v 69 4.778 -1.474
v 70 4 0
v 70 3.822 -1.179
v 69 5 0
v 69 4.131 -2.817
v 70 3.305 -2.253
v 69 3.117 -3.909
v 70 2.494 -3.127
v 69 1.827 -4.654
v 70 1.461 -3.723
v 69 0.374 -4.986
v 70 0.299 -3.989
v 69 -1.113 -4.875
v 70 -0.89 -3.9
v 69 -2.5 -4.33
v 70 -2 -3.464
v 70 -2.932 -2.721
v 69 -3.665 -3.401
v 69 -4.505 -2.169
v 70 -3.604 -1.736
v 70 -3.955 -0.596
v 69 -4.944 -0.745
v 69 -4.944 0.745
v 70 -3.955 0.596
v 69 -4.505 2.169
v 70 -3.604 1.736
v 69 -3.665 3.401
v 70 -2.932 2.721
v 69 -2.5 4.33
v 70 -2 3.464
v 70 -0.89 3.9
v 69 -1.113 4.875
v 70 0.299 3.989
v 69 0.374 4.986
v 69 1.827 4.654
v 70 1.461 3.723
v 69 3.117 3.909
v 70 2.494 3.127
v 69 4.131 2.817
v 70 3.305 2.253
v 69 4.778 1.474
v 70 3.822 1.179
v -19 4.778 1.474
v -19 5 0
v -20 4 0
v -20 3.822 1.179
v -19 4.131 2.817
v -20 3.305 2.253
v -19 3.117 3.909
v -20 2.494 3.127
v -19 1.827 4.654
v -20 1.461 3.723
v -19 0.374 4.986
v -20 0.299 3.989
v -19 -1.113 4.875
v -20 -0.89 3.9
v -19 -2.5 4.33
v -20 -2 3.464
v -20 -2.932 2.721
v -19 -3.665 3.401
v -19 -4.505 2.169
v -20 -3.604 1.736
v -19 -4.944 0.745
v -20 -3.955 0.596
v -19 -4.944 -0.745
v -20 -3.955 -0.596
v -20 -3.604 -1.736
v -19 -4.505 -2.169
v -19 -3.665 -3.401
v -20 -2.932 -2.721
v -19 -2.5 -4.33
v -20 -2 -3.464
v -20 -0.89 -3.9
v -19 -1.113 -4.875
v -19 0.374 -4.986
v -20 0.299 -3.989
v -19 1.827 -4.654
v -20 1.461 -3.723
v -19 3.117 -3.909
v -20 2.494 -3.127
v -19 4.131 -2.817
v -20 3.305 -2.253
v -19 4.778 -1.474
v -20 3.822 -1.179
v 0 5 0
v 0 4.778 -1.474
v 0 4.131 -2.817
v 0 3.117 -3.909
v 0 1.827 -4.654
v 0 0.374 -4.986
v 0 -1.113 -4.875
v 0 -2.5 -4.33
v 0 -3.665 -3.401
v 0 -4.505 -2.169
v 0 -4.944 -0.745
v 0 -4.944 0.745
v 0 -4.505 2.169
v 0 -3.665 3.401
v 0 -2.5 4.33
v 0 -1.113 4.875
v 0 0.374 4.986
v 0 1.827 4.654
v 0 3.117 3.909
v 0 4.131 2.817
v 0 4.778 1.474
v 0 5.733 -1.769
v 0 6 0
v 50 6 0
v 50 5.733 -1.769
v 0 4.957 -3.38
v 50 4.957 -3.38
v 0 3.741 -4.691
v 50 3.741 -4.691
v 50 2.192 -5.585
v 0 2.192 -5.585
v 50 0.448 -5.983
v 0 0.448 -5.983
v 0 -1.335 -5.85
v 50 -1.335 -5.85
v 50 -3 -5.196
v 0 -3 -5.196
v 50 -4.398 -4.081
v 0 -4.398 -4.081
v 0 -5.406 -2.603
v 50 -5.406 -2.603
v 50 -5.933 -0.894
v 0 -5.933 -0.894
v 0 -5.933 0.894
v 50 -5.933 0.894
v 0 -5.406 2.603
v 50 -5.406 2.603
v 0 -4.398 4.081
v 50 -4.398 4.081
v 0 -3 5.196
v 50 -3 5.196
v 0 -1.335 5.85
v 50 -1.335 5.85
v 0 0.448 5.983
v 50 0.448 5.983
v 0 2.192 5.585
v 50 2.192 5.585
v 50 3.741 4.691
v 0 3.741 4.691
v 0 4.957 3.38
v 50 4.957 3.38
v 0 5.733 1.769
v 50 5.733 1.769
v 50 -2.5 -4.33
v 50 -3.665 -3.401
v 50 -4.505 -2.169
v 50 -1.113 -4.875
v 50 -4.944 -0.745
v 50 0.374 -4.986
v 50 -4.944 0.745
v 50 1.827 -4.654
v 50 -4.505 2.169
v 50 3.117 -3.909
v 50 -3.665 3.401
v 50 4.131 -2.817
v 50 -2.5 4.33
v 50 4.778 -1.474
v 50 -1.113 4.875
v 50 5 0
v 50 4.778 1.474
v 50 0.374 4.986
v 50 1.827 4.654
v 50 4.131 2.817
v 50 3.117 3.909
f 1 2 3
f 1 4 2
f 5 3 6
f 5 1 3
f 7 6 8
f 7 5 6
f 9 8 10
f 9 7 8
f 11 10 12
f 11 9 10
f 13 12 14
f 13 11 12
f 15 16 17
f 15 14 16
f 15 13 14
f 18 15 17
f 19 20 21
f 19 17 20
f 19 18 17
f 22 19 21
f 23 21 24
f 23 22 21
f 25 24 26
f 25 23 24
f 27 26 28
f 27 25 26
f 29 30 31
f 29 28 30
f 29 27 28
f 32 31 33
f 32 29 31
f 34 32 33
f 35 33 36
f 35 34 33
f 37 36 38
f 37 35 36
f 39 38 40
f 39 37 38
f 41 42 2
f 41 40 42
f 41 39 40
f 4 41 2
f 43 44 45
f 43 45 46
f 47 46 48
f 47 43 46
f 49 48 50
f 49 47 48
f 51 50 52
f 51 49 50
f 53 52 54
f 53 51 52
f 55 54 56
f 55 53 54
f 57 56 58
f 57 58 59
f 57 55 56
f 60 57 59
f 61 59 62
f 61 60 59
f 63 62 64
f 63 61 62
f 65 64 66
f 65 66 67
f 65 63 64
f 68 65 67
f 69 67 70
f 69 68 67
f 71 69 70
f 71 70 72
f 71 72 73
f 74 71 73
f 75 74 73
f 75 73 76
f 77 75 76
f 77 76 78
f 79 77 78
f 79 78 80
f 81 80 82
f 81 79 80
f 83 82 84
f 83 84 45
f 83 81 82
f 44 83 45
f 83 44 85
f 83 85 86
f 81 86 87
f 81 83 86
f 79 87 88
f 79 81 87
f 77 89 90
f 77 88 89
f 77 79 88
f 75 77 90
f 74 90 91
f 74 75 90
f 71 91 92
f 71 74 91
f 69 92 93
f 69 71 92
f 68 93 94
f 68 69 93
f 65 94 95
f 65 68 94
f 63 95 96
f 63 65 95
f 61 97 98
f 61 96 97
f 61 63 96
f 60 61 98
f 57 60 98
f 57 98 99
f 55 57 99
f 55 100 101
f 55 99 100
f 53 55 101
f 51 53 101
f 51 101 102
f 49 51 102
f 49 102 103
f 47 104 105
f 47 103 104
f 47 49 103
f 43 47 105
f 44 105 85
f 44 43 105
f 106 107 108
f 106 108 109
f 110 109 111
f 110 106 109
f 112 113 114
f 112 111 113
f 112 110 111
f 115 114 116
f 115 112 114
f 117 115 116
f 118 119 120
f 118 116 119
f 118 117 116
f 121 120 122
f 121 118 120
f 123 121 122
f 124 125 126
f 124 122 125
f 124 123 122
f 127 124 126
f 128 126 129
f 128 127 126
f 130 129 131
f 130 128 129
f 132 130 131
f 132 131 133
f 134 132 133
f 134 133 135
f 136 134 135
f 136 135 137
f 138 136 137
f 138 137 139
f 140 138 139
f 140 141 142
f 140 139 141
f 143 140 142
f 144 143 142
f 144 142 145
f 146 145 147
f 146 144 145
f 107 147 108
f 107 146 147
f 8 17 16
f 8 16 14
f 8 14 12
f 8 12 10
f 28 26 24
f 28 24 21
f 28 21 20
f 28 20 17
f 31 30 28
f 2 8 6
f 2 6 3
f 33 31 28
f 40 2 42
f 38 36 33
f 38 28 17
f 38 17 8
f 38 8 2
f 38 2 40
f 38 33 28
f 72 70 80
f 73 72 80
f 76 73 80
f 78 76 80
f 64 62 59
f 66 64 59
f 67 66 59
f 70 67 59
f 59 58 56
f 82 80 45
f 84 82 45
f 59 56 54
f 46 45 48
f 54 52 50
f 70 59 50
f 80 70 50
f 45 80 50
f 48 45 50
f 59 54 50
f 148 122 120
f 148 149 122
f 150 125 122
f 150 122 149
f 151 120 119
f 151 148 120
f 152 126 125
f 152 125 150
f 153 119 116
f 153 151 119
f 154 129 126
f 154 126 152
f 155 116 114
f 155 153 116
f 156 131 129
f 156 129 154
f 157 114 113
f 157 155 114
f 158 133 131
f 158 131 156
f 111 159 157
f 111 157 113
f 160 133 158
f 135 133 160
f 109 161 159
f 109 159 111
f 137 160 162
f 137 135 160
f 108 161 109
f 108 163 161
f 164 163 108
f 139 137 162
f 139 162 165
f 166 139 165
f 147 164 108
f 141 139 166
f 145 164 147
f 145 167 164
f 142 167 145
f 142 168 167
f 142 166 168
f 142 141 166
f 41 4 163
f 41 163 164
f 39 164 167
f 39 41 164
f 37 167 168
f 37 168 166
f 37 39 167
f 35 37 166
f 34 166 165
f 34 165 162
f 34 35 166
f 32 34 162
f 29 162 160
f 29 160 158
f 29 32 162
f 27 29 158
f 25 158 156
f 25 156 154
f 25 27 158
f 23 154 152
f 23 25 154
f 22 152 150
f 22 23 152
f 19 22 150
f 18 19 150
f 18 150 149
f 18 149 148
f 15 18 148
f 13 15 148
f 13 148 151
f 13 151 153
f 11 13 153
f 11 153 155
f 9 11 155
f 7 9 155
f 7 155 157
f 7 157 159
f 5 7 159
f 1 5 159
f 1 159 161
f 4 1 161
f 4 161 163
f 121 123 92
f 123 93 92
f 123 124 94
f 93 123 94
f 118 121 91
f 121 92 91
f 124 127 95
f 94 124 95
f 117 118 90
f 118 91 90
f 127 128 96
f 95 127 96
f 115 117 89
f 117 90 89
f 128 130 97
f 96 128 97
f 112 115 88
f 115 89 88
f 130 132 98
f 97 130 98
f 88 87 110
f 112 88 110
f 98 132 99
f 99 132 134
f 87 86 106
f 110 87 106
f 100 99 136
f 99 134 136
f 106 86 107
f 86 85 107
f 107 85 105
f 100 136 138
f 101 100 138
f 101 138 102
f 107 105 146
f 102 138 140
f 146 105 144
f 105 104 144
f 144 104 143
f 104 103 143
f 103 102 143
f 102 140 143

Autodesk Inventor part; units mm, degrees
ref_plane "YZ Plane" through (0, 0, 0) normal (1, 0, 0) x (0, 1, 0)
ref_plane "XY Plane" through (0, 0, 0) normal (0, 0, 1) x (1, 0, 0)
sketch "Sketch1" plane through (0, 0, 0) normal (0, 0, 1) x (1, 0, 0)
  line L0 (0, 0) -> (70, 0)
  line L1 (0, 6) -> (0, 0)
  line L2 (50, 6) -> (50, 5)
  line L3 (50, 5) -> (70, 5)
  line L4 (70, 5) -> (70, 0)
  line L5 (50, 6) -> (0, 6)
  line L6 (0, 6) -> (0, 5)
  line L7 (0, 5) -> (-20, 5)
  line L8 (-20, 5) -> (-20, 0)
  line L9 (-20, 0) -> (0, 0)
  dimension "d10" = 1
  dimension "d11" = 20
  dimension "d12" = 5
  dimension "d16" = 20
  dimension "d17" = 5
  dimension "d18" = 50
revolve "Revolution1" add sketch "Sketch1" angle 360 about axis through (0, 0, 0) along (1, 0, 0)
thread "Thread2" size "M12x1.75" class "6g" standard "ANSI Metric M Profile" full length
ref_plane "Work Plane1" through (25, 0, 0) normal (1, 0, 0) x (0, 0, -1)
chamfer "Chamfer2" distance 1 angle 45 2 edges at (70, -5, 0) (-20, -5, 0)
properties part number "Rocker Base Shaft"
